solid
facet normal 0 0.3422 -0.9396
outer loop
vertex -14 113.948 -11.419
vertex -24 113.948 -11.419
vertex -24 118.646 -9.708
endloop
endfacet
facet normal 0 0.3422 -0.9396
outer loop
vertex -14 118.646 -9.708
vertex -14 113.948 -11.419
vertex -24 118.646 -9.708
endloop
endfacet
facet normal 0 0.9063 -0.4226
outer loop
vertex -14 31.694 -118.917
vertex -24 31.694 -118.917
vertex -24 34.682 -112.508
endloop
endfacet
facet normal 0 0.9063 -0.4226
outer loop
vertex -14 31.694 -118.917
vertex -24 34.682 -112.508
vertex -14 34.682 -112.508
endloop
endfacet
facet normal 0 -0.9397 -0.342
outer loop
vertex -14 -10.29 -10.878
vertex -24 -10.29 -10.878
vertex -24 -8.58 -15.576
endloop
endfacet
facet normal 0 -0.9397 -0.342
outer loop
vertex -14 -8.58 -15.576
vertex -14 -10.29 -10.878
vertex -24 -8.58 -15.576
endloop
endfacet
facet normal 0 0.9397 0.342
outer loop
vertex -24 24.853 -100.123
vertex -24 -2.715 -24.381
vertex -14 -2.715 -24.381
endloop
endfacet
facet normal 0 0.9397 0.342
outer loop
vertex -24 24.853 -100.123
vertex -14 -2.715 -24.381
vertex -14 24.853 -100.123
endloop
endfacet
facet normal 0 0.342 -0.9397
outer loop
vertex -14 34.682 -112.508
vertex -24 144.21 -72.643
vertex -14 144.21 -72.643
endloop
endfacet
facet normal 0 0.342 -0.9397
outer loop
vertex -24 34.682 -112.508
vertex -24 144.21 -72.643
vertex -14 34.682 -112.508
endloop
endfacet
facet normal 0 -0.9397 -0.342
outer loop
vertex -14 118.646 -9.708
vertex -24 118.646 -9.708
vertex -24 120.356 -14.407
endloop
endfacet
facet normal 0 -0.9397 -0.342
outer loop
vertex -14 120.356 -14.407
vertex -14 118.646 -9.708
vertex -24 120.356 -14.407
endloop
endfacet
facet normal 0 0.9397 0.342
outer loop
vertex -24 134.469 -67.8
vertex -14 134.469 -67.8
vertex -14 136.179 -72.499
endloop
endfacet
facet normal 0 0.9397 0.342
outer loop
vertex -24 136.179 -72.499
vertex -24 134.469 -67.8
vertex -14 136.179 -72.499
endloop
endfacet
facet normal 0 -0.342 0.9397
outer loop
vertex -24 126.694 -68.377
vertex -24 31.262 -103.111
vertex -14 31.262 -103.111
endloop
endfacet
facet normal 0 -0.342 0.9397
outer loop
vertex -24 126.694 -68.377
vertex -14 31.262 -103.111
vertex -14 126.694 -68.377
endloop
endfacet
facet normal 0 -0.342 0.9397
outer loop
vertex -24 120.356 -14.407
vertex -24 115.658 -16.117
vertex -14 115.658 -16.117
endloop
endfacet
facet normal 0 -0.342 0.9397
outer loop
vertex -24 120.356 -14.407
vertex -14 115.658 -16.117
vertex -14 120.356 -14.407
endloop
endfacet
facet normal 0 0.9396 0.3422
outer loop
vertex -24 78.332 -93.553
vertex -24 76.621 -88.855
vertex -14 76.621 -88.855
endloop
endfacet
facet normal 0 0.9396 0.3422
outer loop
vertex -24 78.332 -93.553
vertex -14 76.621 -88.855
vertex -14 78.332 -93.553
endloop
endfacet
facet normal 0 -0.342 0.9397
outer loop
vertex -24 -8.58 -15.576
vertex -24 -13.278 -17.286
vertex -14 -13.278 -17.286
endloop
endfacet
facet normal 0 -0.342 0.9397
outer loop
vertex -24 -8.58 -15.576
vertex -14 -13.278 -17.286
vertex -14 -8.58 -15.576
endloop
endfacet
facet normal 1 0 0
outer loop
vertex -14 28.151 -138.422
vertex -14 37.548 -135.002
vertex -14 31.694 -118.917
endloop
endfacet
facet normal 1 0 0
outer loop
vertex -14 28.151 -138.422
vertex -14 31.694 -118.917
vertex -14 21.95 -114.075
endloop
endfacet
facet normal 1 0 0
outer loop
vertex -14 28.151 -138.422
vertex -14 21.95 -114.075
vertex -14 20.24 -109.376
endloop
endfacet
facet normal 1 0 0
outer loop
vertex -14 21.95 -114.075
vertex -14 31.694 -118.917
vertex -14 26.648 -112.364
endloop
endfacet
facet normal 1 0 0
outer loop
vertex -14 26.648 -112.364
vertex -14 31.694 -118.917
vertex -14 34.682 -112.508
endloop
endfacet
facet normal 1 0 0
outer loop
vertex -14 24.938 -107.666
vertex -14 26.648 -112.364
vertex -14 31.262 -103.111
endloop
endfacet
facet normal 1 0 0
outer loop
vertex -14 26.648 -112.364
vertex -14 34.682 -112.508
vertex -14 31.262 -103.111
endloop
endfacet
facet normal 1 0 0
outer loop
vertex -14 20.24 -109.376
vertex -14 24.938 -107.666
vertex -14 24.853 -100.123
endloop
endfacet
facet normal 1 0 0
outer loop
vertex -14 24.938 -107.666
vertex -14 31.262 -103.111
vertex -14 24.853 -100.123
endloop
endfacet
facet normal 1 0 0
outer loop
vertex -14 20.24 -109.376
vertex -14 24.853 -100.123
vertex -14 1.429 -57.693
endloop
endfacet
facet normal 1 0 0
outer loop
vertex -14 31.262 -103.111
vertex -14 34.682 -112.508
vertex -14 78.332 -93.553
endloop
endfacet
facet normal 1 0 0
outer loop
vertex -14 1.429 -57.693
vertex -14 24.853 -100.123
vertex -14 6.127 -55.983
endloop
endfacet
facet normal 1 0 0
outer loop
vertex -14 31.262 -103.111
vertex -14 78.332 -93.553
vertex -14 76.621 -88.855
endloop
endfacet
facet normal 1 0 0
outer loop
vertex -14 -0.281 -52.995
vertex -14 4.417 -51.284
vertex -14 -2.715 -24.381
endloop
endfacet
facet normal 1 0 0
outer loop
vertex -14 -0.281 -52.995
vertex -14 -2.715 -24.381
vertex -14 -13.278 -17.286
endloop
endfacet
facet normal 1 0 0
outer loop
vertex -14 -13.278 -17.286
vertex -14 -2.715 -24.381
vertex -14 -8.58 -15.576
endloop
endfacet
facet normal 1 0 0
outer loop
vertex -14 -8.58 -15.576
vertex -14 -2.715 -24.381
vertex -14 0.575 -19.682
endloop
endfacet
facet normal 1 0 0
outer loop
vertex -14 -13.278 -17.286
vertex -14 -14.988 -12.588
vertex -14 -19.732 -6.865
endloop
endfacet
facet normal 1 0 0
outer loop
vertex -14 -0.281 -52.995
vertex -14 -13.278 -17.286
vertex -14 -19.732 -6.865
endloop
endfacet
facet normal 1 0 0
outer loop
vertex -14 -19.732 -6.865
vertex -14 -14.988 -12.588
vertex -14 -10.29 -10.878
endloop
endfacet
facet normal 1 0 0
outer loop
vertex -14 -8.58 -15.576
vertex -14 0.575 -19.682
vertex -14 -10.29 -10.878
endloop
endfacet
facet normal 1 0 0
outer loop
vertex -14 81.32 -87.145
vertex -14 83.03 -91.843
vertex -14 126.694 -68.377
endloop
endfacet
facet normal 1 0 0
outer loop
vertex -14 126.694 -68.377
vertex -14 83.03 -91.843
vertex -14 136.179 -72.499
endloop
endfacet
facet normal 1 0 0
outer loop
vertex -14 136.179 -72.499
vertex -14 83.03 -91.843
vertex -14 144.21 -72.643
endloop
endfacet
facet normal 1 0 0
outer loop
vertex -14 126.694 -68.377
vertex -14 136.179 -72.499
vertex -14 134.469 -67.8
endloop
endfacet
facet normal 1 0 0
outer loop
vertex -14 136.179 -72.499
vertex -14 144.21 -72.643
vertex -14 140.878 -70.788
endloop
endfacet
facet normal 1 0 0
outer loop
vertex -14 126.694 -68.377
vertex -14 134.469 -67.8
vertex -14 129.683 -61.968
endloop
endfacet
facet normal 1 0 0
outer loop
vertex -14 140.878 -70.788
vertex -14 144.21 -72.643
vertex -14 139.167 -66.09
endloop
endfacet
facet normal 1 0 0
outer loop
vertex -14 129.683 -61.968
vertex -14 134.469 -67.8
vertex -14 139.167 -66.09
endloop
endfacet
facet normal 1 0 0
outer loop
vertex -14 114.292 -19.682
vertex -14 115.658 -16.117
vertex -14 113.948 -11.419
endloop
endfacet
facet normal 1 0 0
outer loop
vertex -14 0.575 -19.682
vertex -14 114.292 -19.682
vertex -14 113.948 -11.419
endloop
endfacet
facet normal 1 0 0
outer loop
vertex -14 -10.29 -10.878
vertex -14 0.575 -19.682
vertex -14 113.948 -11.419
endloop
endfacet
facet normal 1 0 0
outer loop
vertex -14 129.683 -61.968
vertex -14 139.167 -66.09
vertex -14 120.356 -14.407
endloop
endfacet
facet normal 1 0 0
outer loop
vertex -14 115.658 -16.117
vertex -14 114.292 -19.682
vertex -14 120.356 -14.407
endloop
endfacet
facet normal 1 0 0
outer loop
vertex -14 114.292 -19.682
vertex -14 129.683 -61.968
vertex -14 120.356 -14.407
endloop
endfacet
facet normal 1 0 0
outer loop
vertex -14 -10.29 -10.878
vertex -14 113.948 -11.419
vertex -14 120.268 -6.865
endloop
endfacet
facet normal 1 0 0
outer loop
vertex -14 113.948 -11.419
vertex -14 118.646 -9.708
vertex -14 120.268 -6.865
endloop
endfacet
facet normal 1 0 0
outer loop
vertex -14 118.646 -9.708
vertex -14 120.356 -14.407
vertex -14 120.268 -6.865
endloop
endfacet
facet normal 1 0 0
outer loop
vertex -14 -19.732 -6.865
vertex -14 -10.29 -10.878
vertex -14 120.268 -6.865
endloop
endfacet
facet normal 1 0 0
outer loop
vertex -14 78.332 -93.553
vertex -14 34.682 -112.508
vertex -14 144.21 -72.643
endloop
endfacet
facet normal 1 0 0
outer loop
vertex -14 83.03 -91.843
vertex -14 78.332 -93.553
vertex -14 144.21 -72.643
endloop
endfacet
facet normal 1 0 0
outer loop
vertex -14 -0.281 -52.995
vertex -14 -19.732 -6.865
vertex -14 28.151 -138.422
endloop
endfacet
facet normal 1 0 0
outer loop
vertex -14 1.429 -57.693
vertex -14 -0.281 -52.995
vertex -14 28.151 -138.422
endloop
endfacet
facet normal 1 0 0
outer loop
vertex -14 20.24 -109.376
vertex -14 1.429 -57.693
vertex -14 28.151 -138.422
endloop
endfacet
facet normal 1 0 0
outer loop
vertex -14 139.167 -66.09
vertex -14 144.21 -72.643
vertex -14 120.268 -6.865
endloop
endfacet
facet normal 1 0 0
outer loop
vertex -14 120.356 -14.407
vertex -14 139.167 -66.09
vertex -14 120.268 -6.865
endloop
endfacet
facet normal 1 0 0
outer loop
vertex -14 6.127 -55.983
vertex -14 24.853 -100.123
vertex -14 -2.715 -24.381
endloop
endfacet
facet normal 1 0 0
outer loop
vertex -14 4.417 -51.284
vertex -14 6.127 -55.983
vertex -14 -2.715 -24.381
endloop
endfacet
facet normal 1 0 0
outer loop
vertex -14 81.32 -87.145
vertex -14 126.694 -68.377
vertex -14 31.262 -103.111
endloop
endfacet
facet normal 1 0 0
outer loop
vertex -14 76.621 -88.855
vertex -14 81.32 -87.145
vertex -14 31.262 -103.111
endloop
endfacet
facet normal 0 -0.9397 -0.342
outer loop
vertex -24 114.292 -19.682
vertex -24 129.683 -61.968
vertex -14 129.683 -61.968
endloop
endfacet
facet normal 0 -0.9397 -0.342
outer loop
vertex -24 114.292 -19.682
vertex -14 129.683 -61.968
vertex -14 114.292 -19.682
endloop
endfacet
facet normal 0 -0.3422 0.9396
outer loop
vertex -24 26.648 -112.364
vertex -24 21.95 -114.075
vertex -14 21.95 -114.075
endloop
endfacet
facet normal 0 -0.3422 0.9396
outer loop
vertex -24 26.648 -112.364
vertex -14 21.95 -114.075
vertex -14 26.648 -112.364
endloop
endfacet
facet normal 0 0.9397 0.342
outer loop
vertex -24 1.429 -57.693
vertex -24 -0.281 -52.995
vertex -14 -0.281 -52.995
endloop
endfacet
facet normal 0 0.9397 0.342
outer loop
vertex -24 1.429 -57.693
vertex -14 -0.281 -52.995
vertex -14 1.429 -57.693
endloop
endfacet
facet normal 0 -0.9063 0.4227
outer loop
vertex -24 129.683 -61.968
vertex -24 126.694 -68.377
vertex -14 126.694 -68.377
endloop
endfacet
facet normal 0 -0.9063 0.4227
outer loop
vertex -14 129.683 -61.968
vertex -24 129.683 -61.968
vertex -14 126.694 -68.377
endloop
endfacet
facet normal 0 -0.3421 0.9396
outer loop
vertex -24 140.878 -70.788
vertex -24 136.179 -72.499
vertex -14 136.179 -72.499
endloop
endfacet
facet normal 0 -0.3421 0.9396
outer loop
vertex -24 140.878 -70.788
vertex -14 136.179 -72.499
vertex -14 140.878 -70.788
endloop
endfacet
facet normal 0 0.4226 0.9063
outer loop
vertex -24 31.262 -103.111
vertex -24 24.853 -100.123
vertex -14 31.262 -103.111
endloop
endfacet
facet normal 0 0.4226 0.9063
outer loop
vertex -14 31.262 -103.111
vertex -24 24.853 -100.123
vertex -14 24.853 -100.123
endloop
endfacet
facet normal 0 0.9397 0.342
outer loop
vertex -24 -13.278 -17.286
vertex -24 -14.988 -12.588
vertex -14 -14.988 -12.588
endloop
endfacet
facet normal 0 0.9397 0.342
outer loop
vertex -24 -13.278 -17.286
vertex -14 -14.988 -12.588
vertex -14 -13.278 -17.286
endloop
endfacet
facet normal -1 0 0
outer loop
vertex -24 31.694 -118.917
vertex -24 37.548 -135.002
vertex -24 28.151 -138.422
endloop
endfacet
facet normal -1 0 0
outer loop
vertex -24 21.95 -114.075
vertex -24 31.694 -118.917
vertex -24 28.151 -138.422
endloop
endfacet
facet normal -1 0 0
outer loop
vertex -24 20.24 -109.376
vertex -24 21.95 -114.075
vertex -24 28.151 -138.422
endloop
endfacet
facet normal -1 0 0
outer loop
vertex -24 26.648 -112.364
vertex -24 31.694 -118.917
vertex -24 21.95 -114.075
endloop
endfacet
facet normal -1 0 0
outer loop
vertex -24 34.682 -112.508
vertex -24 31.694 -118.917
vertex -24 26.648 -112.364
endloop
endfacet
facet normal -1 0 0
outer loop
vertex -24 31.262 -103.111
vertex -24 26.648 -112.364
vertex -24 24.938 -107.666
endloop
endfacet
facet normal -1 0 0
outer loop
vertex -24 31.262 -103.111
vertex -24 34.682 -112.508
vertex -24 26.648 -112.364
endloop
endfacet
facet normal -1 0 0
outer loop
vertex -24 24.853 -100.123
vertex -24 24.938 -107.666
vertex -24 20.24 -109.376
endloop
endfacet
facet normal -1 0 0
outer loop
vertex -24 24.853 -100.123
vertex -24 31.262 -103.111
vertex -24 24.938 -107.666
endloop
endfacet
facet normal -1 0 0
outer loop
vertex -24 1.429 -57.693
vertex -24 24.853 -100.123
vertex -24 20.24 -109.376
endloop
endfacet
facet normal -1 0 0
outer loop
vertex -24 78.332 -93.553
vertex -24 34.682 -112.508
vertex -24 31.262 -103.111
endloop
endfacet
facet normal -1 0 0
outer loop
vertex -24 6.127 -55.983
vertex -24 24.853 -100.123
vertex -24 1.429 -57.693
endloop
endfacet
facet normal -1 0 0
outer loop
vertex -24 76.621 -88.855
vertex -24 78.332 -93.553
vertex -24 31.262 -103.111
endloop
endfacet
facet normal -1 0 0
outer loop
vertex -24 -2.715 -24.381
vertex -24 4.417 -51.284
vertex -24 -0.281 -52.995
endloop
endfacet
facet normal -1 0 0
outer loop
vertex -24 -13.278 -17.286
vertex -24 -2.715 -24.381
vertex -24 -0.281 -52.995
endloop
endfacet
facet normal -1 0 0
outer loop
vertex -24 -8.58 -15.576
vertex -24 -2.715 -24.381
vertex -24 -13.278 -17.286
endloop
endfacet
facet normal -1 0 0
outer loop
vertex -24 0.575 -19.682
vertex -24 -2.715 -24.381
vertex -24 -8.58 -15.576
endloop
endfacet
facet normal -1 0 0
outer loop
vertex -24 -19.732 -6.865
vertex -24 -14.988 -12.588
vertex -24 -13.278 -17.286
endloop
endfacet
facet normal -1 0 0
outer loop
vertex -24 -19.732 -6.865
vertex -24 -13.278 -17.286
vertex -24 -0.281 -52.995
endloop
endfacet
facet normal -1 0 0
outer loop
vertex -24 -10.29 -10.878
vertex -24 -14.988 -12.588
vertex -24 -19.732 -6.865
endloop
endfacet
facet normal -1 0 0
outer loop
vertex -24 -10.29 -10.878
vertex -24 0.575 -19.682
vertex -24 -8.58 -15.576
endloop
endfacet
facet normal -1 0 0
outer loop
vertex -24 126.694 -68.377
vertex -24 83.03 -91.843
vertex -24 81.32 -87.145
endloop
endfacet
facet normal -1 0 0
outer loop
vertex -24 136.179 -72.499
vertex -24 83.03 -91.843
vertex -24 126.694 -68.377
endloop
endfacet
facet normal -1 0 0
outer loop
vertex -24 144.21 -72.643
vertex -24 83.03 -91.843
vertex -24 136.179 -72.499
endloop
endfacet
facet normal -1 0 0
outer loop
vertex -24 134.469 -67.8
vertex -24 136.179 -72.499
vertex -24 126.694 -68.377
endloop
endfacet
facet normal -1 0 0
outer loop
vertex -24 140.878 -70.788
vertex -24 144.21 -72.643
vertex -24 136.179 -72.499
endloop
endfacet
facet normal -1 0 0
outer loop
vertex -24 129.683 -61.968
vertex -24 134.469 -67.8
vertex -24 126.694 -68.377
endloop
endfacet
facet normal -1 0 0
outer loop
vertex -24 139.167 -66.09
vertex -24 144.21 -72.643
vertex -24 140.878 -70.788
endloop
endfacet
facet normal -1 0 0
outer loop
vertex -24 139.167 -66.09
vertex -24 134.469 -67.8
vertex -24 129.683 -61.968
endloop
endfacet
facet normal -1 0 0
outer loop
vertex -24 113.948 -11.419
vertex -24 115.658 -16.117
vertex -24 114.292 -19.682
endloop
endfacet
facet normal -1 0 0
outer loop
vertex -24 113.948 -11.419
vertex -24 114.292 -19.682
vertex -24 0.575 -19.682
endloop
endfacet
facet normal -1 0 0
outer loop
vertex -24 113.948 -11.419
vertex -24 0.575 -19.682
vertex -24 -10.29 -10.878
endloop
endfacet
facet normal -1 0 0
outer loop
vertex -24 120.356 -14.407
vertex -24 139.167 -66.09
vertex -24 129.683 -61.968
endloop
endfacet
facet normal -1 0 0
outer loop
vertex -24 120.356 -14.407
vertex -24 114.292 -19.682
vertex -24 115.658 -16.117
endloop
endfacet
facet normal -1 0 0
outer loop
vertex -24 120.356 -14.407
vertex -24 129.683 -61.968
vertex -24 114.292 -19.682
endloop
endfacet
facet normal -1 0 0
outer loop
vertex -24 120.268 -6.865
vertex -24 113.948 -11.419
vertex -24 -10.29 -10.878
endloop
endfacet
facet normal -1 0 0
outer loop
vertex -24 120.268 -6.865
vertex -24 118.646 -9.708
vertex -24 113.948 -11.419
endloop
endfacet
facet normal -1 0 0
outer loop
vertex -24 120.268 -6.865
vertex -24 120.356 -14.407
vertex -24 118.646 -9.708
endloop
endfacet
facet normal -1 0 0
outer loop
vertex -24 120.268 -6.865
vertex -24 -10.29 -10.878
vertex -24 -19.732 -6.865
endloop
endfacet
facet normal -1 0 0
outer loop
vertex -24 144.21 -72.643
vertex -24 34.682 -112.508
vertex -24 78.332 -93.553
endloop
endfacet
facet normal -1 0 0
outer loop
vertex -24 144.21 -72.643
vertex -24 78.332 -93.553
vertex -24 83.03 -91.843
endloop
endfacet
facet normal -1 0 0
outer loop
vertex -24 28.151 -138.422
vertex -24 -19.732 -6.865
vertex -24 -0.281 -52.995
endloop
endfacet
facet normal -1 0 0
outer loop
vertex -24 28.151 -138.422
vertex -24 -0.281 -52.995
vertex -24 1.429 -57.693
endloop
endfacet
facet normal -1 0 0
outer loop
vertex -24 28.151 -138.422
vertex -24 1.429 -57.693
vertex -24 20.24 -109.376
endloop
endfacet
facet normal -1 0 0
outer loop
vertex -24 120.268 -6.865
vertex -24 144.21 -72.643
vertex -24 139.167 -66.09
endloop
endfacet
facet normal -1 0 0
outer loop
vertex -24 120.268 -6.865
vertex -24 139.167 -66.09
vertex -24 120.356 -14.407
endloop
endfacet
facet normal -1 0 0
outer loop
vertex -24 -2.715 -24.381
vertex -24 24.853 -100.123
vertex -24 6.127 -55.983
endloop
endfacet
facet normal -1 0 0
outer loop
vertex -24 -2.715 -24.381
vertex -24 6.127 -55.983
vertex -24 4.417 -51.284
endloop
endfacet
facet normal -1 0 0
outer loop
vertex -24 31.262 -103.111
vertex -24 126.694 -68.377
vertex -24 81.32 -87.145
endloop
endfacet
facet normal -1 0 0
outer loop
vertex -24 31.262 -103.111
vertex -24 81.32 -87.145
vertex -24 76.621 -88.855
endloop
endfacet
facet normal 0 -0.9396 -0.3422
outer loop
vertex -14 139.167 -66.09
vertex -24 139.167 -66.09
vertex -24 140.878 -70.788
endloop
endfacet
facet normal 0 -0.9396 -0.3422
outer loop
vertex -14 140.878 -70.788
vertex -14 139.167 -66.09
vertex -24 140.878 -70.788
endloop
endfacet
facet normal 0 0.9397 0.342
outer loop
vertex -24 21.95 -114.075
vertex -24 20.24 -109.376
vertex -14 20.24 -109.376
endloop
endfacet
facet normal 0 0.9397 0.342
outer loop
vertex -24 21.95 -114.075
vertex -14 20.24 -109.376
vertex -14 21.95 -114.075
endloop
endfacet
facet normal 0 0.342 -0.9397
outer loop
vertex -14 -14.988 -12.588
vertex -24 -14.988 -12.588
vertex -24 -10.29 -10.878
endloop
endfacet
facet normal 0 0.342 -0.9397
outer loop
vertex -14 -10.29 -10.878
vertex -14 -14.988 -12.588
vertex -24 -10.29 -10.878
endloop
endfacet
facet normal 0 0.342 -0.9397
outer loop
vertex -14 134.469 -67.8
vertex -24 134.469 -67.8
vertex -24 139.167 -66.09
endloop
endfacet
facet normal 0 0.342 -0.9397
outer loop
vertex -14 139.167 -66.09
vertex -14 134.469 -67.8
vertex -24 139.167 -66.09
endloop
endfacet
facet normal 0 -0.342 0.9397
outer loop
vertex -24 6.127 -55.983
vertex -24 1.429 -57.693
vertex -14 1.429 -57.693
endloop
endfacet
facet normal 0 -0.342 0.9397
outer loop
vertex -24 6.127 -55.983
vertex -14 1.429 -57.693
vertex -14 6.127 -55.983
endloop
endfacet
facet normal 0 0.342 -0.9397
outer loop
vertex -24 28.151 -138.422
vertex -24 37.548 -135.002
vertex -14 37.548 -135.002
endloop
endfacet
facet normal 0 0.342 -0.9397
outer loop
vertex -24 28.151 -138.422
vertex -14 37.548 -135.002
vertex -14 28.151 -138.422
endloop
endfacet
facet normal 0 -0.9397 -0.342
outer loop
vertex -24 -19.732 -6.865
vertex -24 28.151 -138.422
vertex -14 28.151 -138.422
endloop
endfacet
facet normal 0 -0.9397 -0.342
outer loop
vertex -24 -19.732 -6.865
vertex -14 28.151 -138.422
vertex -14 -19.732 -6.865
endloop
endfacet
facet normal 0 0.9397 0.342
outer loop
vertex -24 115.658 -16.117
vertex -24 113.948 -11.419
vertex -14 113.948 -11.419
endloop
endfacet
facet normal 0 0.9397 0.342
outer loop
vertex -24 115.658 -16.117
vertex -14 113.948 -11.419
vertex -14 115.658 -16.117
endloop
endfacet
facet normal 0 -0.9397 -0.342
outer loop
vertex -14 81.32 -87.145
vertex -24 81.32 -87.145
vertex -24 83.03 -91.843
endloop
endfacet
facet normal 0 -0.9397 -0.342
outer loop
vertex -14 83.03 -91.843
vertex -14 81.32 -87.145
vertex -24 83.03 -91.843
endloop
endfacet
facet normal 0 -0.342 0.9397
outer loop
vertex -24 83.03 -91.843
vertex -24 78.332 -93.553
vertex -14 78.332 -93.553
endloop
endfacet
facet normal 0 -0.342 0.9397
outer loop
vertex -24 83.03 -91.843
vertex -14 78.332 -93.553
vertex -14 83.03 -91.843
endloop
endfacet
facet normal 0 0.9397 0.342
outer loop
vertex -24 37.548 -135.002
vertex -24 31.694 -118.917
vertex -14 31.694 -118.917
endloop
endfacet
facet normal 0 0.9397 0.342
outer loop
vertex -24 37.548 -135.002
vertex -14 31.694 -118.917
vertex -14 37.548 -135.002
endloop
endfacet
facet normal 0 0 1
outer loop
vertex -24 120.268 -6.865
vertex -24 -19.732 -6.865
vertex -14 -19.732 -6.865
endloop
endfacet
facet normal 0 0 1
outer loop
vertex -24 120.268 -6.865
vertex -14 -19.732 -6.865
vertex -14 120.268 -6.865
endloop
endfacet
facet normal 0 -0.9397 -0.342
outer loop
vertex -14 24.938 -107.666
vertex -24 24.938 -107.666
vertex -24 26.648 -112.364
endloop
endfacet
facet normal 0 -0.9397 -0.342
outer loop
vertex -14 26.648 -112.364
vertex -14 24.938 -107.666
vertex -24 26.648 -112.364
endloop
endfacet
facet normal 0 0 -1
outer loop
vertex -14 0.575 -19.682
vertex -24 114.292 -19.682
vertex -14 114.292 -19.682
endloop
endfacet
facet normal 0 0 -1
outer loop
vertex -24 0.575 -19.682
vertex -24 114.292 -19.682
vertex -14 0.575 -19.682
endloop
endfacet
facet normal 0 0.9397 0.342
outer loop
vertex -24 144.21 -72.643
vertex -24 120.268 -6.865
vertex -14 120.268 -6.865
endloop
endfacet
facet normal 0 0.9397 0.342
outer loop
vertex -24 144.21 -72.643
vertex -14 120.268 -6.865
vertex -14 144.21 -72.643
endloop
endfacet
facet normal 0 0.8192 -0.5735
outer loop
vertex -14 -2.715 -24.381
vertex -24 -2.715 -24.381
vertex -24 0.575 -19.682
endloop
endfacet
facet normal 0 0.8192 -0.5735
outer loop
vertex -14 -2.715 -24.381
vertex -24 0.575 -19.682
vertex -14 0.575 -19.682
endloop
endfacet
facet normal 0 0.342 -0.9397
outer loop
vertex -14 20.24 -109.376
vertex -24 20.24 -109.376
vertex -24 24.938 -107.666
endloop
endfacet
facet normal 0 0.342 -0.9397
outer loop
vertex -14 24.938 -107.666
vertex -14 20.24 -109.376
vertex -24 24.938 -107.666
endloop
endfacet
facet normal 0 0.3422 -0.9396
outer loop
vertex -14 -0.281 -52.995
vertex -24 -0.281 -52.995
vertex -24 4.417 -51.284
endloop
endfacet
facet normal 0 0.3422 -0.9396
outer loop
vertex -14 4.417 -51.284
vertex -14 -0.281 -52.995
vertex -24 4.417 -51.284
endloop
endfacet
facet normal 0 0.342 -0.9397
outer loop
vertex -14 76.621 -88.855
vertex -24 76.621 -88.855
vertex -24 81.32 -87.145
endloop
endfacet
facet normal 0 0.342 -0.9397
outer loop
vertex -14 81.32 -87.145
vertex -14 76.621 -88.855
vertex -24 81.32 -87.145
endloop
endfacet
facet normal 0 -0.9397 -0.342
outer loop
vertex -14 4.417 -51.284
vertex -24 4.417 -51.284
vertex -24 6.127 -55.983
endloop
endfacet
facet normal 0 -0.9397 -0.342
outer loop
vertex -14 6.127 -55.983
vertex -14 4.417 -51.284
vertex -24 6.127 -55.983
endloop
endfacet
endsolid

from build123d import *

# Parameters (mm, degrees)
PAD016_DEPTH            = 10
SKETCH029_W             = 5
SKETCH029_H             = 5
POCKET013_DEPTH         = 10
CHAMFER_SIZE            = 5
BODY008_PLACEMENT_ANGLE = 70


with BuildPart() as part:
    # Sketch030 → Pad016 (new body)
    with BuildSketch(Plane.YZ):
        Polygon((0, 0), (47.88282, 131.556967), (117.88282, 131.556967), (117.88282, 10), (140, 10), (140, 0), align=None)
        Polygon((57.88282, 121.556967), (17.279405, 10), (107.88282, 10), (107.88282, 121.556967), align=None, mode=Mode.SUBTRACT)
    extrude(amount=PAD016_DEPTH)

    # Sketch029 → Pocket013 (cut)
    with BuildSketch(Plane.YZ):
        with Locations((112.5, 5)):
            Rectangle(SKETCH029_W, SKETCH029_H)
        with Locations((9.5, 5)):
            Rectangle(SKETCH029_W, SKETCH029_H)
        with Locations((52.5, 126.56)):
            Rectangle(SKETCH029_W, SKETCH029_H)
        with Locations((112.5, 126.56)):
            Rectangle(SKETCH029_W, SKETCH029_H)
        with Locations((52.5, 5)):
            Rectangle(SKETCH029_W, SKETCH029_H)
        with Locations((112.5, 65)):
            Rectangle(SKETCH029_W, SKETCH029_H)
    extrude(amount=POCKET013_DEPTH, mode=Mode.SUBTRACT)

    # Chamfer
    chamfer_edges = [part.edges().sort_by_distance(p)[0] for p in [
        (5, 117.88282, 10),
        (5, 107.88282, 10),
        (5, 107.88282, 121.556967),
        (5, 17.279405, 10),
    ]]
    chamfer(chamfer_edges, length=CHAMFER_SIZE)


with BuildPart() as part_1:
    # Body008 placement: moved
    add(part.part.moved(Location((-24, -19.731529, -6.864937))).rotate(Axis((-24, -19.731529, -6.864937), (-1, 0, 0)), BODY008_PLACEMENT_ANGLE))


solid = part_1.part
